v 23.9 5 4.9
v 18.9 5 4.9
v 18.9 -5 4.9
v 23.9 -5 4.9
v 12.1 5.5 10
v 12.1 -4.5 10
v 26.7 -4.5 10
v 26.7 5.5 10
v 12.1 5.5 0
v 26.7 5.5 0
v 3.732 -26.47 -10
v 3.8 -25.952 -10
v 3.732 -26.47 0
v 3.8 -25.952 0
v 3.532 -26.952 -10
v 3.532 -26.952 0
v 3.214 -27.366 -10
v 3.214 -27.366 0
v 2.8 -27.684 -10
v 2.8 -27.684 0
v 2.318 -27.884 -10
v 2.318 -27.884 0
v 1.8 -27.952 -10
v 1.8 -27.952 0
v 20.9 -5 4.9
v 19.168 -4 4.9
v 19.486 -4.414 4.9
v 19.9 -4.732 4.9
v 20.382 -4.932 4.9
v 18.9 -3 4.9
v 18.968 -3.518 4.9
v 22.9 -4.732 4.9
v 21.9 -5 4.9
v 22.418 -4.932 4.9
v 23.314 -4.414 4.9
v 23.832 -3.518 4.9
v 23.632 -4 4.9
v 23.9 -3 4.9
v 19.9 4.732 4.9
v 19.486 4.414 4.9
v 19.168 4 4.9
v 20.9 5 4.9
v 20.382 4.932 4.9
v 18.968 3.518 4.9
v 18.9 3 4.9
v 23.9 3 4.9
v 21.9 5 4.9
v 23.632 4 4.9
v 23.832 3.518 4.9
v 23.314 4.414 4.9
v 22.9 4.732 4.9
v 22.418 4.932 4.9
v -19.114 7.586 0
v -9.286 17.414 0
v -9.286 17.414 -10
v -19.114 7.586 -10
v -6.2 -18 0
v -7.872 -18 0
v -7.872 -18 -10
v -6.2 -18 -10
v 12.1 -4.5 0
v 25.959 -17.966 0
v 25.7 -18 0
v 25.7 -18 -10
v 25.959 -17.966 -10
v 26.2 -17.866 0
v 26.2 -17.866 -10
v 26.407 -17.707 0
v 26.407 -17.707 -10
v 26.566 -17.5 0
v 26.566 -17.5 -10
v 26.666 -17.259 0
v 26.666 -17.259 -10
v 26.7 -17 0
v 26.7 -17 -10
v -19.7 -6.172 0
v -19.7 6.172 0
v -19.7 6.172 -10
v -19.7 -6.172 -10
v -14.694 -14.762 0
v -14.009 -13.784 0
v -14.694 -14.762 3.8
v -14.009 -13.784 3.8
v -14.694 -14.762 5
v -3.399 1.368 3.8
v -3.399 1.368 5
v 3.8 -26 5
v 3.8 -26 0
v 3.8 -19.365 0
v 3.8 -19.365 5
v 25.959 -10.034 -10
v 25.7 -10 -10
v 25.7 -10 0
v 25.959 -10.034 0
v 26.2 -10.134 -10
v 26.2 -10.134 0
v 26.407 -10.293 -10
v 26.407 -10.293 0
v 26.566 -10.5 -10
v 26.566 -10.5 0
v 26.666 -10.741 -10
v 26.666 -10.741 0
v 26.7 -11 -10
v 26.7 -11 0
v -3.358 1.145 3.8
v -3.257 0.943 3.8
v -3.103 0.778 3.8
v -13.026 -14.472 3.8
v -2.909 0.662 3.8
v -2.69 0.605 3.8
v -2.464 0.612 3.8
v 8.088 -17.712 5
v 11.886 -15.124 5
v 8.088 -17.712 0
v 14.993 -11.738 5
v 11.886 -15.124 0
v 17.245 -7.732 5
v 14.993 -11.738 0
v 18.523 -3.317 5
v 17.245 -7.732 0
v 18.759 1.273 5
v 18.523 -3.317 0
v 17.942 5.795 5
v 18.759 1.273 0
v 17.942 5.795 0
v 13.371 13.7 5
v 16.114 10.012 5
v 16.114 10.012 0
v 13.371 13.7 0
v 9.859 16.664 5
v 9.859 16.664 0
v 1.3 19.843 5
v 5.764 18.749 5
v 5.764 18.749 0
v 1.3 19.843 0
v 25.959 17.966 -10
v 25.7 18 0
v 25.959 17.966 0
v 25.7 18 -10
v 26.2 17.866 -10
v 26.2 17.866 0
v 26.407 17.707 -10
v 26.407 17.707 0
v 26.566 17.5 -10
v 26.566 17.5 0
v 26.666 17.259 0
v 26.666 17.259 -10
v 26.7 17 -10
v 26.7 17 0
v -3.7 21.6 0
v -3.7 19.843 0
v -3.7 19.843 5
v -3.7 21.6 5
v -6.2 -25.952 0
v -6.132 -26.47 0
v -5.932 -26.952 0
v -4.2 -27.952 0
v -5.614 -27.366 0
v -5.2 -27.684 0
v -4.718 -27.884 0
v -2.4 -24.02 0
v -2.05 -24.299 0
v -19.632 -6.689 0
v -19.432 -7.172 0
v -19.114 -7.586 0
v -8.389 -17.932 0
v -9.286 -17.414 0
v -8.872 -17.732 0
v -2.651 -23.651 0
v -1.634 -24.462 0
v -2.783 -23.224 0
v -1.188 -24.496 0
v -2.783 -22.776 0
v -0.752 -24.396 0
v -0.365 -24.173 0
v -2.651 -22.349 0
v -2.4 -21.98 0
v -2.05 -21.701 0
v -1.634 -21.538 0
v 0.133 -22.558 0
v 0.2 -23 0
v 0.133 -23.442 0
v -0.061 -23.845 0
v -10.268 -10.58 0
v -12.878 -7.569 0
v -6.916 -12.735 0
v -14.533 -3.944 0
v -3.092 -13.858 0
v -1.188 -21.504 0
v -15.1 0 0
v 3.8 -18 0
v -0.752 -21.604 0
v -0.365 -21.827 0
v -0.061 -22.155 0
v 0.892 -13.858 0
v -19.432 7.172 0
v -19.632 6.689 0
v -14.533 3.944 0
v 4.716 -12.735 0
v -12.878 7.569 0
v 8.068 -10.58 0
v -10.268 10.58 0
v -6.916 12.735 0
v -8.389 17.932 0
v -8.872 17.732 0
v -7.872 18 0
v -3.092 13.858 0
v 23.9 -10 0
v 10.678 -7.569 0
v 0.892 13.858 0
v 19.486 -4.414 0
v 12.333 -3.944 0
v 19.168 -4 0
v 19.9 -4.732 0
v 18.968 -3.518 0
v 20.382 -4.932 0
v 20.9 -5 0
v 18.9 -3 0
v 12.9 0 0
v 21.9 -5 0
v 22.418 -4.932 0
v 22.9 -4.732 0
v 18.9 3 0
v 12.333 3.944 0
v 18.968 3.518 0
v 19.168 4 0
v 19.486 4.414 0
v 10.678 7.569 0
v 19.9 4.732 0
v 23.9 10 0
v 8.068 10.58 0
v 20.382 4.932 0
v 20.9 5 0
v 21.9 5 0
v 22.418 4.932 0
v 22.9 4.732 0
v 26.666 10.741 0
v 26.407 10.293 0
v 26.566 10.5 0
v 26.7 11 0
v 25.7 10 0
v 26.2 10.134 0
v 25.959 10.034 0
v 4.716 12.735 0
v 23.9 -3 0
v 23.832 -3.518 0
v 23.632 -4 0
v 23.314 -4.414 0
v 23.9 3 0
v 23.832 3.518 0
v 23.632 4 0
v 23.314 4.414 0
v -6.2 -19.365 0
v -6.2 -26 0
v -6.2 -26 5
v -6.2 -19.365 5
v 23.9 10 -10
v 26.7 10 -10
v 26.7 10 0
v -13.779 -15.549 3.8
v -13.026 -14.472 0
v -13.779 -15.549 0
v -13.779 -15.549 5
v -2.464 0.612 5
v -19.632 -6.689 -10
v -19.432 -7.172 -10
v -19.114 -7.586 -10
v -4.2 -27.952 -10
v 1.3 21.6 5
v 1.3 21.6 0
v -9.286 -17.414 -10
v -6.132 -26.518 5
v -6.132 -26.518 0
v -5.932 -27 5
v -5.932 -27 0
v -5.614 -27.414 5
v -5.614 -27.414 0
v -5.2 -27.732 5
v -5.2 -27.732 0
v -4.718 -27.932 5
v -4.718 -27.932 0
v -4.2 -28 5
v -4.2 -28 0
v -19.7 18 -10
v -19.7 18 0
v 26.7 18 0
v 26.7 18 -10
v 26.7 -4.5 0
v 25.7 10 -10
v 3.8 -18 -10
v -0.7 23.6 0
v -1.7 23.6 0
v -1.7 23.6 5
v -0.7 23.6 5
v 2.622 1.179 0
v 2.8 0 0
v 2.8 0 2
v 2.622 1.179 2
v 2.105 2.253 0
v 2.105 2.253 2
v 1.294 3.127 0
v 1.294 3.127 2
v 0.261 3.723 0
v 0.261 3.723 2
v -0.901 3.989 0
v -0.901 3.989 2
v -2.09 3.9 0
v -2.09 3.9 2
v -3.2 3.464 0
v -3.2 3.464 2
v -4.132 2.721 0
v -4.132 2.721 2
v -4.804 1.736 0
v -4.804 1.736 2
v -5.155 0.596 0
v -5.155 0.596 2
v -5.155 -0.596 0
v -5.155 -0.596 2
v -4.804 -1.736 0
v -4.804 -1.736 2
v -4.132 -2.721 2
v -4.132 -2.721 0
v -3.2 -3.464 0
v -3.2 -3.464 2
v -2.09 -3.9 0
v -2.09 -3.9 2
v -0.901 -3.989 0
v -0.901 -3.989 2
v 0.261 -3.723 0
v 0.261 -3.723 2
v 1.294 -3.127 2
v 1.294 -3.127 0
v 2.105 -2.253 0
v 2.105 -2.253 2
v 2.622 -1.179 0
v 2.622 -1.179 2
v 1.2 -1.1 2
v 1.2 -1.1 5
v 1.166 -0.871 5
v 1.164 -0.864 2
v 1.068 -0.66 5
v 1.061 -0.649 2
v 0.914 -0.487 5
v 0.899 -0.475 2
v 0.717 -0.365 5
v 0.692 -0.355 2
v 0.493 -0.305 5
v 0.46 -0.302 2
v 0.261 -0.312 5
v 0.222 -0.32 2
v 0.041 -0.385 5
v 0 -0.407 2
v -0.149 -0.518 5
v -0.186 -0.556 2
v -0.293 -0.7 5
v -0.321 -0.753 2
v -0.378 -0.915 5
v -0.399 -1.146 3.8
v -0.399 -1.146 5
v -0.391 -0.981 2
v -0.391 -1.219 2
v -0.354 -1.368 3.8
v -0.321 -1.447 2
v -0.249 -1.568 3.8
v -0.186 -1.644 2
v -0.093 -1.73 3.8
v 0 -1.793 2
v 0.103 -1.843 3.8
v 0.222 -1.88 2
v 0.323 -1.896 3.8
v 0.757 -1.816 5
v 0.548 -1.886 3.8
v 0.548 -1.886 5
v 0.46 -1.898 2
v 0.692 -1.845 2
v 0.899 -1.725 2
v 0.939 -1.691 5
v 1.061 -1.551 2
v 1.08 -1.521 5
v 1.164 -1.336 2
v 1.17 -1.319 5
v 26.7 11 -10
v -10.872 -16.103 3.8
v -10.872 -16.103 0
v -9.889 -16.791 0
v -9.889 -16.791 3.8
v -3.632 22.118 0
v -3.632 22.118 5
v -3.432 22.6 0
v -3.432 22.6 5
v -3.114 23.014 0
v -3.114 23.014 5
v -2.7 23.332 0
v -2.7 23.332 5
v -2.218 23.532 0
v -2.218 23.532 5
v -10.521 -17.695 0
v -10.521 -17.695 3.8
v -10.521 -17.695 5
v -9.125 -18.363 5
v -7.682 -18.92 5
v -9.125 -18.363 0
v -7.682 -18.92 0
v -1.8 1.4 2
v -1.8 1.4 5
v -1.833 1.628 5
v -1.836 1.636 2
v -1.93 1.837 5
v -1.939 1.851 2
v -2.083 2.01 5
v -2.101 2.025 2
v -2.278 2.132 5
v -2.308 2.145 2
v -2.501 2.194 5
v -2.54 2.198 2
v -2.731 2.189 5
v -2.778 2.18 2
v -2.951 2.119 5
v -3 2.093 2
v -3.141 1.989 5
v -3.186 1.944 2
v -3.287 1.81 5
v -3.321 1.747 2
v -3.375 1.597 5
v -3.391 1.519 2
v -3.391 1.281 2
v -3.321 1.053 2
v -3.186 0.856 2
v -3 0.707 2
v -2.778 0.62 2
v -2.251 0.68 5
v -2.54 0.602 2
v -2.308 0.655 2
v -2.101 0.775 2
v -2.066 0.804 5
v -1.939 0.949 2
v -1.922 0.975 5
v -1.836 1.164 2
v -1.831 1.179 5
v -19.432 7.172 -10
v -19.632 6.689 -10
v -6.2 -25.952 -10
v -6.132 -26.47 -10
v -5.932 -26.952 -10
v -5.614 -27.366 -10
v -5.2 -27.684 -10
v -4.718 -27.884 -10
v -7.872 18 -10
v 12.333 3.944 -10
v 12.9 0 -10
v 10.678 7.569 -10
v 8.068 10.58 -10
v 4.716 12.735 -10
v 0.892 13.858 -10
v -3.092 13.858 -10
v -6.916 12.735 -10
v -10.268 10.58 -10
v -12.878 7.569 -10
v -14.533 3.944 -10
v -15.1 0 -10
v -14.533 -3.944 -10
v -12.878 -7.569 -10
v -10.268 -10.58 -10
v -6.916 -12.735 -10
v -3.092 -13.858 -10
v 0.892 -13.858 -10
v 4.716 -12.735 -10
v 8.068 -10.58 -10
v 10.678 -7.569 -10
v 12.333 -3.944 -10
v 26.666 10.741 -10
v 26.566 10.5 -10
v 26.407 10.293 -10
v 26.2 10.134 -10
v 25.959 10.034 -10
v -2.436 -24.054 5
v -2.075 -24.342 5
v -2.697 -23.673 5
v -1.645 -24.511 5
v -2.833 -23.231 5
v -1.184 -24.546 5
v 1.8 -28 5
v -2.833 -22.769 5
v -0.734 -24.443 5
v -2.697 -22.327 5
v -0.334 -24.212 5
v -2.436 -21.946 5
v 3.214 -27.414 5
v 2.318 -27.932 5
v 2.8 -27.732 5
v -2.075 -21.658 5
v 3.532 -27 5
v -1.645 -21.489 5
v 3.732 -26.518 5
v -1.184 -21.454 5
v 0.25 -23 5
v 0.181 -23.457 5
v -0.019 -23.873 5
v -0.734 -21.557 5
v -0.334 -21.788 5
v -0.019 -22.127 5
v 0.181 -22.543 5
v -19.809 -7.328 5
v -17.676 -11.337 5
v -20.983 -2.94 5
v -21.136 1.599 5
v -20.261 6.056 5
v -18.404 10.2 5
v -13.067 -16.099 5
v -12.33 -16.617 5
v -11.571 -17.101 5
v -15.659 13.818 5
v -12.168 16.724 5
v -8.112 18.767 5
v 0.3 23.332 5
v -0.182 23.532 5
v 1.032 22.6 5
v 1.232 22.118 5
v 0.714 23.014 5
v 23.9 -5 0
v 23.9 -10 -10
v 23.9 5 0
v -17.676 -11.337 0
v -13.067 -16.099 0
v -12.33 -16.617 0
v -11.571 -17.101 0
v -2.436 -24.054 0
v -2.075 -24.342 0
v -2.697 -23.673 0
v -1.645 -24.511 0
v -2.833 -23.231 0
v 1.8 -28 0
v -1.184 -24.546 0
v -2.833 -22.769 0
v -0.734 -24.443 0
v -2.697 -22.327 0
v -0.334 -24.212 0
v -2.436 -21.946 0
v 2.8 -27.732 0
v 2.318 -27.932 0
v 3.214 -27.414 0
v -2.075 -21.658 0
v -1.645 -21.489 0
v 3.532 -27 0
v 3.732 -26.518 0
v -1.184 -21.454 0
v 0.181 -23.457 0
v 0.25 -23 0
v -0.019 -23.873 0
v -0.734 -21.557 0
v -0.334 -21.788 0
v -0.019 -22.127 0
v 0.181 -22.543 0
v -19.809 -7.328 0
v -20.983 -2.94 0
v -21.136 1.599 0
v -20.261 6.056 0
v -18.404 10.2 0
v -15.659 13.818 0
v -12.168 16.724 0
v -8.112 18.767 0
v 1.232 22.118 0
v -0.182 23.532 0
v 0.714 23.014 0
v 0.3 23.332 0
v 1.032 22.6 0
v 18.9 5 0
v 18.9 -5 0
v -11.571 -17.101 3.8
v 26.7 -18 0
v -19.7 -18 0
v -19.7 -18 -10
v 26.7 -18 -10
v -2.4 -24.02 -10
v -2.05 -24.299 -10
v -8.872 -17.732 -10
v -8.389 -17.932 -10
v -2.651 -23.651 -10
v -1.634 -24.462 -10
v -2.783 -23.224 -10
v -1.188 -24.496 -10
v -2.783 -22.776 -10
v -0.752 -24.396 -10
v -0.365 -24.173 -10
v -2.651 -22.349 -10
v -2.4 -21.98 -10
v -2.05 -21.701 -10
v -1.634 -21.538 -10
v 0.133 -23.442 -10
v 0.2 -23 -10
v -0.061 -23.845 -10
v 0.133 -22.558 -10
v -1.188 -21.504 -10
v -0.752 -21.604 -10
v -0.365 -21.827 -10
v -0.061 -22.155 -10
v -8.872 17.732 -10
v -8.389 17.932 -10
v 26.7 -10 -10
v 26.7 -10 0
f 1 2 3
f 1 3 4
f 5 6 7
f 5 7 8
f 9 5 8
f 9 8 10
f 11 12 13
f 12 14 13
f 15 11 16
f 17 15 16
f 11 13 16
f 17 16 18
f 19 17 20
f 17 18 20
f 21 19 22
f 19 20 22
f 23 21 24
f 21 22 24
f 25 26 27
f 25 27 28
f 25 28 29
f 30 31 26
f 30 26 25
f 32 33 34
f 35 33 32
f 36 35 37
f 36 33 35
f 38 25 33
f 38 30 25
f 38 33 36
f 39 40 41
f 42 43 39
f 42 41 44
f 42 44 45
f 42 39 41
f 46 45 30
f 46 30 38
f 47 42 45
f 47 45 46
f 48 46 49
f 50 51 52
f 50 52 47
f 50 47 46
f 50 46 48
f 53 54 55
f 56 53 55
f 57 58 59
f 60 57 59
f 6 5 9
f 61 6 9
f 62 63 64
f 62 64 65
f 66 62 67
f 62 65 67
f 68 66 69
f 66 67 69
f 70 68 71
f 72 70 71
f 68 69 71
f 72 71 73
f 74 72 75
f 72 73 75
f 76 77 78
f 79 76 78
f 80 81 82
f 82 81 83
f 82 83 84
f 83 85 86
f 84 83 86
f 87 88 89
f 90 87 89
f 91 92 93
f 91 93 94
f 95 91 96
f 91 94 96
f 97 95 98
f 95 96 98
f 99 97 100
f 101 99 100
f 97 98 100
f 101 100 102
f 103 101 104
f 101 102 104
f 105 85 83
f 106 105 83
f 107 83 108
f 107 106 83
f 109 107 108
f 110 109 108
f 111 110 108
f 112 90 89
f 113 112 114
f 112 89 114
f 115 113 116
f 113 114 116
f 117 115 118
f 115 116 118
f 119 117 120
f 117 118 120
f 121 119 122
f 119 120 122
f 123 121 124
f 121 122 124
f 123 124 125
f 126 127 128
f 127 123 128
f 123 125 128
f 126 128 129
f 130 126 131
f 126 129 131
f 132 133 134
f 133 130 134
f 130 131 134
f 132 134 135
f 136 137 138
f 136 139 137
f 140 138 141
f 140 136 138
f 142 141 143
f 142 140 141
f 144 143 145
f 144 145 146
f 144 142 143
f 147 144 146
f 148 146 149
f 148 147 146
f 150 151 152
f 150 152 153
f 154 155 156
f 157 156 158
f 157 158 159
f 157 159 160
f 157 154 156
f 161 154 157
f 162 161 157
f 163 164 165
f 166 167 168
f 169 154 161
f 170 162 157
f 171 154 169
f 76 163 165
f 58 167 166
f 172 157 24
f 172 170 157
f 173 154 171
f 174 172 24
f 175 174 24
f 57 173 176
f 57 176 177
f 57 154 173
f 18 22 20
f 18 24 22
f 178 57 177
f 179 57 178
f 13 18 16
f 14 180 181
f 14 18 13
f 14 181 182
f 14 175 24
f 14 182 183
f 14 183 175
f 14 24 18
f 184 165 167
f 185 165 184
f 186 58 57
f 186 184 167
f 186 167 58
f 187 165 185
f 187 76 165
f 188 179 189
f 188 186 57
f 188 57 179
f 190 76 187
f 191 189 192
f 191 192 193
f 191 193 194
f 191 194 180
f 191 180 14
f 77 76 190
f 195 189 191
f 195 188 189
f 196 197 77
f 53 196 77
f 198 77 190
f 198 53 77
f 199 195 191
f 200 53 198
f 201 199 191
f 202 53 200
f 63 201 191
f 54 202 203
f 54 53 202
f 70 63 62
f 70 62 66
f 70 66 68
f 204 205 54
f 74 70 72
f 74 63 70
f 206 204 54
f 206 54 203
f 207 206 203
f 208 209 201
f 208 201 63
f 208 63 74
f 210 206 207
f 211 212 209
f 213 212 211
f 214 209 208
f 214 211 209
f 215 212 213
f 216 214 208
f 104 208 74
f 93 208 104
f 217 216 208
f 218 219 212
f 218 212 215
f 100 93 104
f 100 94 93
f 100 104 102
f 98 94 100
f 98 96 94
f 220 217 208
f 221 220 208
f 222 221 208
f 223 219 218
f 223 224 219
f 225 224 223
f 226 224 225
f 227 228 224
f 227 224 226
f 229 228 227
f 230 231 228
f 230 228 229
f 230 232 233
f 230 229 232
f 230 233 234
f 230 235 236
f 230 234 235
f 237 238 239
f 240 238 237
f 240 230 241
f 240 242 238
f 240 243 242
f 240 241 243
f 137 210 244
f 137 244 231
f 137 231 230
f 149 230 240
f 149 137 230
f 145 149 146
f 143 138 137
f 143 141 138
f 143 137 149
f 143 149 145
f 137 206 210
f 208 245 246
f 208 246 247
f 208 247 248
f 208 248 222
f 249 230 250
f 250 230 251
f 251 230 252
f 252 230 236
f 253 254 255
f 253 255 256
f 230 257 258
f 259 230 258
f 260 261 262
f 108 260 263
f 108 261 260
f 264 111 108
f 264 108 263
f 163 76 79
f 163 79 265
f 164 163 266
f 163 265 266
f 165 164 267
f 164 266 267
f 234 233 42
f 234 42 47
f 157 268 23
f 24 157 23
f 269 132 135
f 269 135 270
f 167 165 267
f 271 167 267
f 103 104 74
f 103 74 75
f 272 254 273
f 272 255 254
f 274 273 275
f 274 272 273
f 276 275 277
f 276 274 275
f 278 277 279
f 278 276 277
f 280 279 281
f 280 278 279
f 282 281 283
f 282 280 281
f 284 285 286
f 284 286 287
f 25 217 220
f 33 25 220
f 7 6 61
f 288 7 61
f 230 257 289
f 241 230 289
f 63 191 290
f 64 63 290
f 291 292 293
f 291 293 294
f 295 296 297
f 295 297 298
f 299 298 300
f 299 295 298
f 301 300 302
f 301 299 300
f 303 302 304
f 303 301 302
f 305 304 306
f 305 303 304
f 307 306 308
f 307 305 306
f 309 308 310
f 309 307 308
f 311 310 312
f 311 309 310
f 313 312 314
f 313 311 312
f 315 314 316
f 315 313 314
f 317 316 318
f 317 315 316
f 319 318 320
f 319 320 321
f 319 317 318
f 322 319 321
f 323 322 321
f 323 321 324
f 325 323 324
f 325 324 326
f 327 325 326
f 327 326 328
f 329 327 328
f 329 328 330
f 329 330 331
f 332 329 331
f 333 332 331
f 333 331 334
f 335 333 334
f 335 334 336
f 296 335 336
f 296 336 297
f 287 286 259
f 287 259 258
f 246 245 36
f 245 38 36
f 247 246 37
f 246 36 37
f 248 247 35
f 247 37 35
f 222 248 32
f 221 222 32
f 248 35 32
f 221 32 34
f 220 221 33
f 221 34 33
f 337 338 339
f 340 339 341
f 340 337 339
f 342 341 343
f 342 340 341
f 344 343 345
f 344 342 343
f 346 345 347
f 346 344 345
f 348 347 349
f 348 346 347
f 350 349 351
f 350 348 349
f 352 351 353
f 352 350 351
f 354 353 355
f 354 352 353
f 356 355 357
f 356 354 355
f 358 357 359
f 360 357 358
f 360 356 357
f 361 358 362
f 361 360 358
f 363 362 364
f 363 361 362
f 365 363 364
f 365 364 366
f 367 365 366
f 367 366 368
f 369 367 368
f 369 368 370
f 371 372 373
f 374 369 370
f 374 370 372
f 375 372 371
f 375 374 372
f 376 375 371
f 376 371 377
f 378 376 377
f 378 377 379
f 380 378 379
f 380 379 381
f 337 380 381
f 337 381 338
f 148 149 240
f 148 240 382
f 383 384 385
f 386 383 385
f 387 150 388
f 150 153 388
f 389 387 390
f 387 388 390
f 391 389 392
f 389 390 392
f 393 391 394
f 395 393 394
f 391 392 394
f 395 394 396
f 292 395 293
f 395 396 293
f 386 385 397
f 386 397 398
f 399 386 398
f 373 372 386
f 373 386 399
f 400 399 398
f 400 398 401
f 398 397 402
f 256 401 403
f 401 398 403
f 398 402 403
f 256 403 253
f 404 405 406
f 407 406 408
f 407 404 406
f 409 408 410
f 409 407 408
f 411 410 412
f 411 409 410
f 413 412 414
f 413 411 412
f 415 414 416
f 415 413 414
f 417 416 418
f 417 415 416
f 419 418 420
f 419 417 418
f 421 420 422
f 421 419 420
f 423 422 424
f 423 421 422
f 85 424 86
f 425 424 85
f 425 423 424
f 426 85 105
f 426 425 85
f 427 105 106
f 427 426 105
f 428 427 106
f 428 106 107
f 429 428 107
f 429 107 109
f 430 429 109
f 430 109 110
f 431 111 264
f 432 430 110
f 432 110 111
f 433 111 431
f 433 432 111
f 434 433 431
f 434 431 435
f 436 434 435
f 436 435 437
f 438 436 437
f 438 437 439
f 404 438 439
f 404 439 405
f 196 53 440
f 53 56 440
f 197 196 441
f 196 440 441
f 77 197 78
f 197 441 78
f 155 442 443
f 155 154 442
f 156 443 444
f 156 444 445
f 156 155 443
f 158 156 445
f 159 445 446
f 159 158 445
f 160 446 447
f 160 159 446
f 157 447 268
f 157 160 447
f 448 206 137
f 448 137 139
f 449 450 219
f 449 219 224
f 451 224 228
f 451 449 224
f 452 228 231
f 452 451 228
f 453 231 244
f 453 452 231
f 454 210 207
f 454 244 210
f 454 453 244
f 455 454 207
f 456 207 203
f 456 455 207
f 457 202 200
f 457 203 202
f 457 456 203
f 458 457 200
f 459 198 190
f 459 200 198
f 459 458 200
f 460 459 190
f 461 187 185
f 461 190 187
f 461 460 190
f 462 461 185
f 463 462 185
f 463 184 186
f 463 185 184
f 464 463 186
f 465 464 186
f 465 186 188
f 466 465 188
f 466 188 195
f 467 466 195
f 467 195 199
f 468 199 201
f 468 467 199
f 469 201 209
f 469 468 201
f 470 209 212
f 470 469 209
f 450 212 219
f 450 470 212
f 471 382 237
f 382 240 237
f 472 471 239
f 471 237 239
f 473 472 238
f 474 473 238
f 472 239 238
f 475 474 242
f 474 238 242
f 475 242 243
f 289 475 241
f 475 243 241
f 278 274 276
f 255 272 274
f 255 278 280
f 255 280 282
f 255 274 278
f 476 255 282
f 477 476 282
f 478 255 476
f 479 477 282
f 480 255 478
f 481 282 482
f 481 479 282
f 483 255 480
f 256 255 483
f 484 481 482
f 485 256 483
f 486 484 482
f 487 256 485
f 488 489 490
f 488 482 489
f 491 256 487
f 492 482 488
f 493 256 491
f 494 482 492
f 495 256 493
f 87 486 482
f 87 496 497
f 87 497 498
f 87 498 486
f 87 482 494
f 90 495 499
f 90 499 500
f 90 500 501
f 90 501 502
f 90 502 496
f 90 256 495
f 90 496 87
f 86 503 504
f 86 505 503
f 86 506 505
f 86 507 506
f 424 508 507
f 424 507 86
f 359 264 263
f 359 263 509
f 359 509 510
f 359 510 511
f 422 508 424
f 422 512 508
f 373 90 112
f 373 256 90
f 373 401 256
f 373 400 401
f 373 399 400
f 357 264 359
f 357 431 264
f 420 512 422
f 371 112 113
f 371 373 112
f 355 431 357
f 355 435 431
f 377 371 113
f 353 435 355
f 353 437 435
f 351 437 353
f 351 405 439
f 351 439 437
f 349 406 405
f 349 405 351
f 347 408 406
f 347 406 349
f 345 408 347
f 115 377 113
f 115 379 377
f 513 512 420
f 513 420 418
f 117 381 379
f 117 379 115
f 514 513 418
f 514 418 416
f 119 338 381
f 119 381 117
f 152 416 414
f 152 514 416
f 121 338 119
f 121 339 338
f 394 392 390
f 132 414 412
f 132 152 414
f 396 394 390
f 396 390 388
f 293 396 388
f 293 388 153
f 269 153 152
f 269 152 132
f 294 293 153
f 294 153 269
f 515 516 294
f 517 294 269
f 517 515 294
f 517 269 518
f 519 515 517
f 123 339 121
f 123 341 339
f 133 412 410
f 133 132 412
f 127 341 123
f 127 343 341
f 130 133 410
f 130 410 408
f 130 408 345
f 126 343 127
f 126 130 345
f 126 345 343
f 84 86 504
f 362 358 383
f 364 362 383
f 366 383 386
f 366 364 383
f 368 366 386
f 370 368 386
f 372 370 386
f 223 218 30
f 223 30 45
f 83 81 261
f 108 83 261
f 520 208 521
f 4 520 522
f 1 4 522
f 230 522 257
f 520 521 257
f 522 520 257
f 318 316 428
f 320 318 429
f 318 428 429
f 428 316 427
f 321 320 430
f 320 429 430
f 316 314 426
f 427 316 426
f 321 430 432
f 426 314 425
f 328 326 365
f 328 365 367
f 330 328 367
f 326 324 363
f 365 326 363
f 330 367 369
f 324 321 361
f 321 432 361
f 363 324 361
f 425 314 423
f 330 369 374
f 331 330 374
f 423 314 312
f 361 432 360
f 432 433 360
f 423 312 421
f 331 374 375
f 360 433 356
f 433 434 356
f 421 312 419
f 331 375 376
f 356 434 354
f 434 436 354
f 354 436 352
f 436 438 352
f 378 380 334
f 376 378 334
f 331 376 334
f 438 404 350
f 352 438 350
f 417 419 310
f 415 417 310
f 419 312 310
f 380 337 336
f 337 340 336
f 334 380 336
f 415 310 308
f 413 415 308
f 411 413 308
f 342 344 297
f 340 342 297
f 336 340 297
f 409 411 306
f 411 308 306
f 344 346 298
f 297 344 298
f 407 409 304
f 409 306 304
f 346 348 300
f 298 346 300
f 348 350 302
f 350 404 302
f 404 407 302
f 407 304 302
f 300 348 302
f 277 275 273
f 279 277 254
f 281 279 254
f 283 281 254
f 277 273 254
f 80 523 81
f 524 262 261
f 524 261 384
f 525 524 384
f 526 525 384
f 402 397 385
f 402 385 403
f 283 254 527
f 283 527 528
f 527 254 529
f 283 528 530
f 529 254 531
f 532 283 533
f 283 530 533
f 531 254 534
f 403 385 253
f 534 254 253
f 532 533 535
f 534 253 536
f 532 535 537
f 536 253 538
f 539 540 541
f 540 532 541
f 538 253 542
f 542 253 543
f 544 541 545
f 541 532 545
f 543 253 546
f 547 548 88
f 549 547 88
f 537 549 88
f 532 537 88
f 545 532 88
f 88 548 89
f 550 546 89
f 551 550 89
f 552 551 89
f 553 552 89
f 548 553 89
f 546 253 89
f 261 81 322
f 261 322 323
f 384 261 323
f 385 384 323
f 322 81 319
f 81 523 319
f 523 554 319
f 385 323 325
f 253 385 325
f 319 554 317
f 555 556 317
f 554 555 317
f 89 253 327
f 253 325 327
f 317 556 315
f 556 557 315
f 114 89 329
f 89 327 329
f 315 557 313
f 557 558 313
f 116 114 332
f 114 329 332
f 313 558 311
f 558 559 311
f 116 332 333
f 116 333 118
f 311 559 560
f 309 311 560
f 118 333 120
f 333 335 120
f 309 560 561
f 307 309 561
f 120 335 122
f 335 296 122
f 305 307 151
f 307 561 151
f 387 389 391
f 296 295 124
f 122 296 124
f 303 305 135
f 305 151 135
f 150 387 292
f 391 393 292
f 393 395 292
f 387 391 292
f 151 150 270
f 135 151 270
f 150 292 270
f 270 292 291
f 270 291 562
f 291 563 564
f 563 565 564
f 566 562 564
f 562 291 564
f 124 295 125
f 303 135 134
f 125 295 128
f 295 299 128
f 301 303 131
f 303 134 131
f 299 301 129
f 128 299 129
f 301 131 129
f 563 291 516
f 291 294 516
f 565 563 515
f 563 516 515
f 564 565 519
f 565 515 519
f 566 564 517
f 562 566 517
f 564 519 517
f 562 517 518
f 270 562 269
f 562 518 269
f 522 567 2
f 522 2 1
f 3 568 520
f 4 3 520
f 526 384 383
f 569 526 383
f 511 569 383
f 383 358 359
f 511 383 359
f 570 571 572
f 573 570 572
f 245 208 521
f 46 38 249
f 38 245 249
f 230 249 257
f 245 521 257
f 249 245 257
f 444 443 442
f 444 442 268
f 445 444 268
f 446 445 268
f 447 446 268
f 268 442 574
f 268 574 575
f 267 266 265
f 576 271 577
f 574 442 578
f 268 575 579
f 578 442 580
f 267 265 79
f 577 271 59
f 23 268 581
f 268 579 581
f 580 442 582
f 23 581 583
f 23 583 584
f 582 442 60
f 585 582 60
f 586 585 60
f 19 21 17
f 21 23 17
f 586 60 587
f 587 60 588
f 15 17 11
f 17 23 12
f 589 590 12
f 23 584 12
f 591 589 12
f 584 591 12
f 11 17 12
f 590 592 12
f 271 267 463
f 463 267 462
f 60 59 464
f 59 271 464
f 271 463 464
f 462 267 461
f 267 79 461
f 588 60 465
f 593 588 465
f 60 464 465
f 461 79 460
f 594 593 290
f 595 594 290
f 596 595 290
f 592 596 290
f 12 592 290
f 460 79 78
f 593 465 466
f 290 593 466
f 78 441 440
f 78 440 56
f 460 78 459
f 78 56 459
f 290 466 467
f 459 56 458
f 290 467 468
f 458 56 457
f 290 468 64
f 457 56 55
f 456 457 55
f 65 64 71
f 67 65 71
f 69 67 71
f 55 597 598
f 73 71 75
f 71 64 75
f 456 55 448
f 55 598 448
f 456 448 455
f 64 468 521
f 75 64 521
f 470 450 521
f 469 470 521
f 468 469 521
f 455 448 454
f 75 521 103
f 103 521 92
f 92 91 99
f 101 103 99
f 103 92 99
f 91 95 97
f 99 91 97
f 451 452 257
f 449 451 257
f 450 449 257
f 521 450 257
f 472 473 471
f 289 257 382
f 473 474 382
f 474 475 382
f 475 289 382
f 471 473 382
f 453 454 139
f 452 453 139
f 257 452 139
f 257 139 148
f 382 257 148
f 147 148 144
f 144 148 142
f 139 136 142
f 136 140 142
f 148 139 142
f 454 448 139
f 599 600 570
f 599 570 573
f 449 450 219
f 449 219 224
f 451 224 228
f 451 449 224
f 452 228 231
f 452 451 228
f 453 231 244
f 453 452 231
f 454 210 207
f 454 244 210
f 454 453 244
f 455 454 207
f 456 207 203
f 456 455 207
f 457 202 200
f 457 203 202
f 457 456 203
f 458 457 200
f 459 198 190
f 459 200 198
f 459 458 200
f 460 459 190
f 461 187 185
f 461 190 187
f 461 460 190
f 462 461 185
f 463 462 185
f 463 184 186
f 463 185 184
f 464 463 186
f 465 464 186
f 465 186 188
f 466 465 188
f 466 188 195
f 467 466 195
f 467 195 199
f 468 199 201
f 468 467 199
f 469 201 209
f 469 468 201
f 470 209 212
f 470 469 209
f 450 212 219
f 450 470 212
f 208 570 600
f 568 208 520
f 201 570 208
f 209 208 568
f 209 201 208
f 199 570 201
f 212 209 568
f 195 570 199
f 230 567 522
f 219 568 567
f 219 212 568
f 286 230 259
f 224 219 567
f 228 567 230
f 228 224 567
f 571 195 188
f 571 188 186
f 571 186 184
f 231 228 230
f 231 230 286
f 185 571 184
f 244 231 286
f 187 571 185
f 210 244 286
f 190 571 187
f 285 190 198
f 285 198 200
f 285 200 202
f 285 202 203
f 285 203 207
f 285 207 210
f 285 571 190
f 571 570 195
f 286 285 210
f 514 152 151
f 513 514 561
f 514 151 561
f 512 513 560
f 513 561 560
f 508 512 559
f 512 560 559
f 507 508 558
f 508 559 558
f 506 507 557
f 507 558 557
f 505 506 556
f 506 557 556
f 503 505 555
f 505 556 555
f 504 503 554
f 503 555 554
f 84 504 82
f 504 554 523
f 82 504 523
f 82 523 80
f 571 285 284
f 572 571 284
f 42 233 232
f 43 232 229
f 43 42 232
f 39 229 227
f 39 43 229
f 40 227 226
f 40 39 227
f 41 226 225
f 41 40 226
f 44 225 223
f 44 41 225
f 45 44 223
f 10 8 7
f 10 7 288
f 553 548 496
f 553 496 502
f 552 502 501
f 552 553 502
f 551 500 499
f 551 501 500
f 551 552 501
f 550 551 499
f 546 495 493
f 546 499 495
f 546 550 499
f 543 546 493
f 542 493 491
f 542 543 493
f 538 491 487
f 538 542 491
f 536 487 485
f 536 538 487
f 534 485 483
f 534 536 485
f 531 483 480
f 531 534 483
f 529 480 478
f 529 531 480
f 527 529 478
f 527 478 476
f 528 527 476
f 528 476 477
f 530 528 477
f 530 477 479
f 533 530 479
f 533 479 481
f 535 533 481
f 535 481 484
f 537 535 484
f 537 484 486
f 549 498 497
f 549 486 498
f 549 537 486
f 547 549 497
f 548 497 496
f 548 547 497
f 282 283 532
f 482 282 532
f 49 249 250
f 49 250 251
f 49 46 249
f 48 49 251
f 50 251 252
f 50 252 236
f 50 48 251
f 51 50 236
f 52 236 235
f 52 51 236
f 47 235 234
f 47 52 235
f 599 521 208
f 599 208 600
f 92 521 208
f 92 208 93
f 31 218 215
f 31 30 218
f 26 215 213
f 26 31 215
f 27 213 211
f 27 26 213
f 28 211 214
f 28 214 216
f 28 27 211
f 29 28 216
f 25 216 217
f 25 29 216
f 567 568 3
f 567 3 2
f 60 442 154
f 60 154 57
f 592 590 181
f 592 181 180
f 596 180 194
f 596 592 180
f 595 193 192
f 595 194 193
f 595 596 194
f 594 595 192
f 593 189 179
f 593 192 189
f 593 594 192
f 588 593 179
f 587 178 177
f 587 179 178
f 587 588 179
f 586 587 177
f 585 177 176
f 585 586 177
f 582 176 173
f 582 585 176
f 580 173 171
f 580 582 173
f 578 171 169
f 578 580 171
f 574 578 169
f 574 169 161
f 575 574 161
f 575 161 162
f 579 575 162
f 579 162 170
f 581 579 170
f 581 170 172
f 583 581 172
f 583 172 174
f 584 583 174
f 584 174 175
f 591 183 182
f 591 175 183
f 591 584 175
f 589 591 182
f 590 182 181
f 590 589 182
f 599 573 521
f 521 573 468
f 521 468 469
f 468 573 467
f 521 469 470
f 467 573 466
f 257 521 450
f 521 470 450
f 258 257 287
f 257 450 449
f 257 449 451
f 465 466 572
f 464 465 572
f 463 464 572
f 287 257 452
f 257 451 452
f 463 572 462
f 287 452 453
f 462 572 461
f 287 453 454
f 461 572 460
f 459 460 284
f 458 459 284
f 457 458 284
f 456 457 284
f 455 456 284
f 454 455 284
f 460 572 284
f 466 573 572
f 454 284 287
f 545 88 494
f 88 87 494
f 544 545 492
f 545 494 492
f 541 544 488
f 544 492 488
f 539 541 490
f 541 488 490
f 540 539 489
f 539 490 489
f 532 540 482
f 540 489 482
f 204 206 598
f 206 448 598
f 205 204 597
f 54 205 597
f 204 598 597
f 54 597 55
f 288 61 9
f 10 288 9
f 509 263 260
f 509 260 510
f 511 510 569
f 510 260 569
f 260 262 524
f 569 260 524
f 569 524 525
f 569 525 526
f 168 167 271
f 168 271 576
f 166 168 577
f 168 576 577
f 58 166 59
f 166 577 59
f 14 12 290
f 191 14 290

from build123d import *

# Parameters (mm, degrees)
BOX001_W               = 10
BOX001_H               = 10
BOX001_DEPTH           = 14.6
BOX004_W               = 5
BOX004_H               = 10
BOX004_DEPTH           = 5
BOX005_W               = 10
BOX005_H               = 20
BOX005_DEPTH           = 20
CYLINDER_R             = 14
CYLINDER_DEPTH         = 40
BOX_W                  = 10
BOX_H                  = 36
BOX_DEPTH              = 46.4
BOX006_W               = 5
BOX006_H               = 5
BOX006_DEPTH           = 5
CYLINDER003_R          = 1.55
CYLINDER003_DEPTH      = 50
BOX003_W               = 10
BOX003_H               = 14
BOX003_DEPTH           = 5
BOX010_W               = 1.2
BOX010_H               = 30
BOX010_DEPTH           = 10
BOX010_ROLL_ANGLE      = 90
BOX010_PLACEMENT_ANGLE = -35
BOX009_W               = 1.2
BOX009_H               = 30
BOX009_DEPTH           = 10
BOX009_ROLL_ANGLE      = 90
BOX009_PLACEMENT_ANGLE = -35
BOX008_W               = 1.2
BOX008_H               = 30
BOX008_DEPTH           = 10
BOX008_PLACEMENT_ANGLE = 325
BOX007_W               = 1.2
BOX007_H               = 30
BOX007_DEPTH           = 10
BOX007_PLACEMENT_ANGLE = 325
CYLINDER006_R          = 0.8
CYLINDER006_DEPTH      = 30
CYLINDER005_R          = 0.8
CYLINDER005_DEPTH      = 30
CYLINDER004_R          = 4
CYLINDER004_DEPTH      = 10
CYLINDER002_R          = 20
CYLINDER002_DEPTH      = 5
FILLET_R               = 2
CYLINDER001_R          = 1.5
CYLINDER001_DEPTH      = 30
BOX002_W               = 10
BOX002_H               = 10
BOX002_DEPTH           = 10
FILLET001_R            = 2
FILLET002_R            = 1
FILLET003_R            = 1
FILLET004_R            = 2
CHAMFER_SIZE           = 11
FILLET005_R            = 2


with BuildPart() as cube001:
    # Box001 → Box001 (new body)
    with BuildSketch(Plane(origin=(12.1, -4.5, 10), x_dir=(0, 0, -1), z_dir=(1, 0, 0))):
        with Locations((5, 5)):
            Rectangle(BOX001_W, BOX001_H)
    extrude(amount=BOX001_DEPTH)


with BuildPart() as swivelstop:
    # Box004 → Box004 (new body)
    with BuildSketch(Plane(origin=(18.9, -5, -0.1), x_dir=(1, 0, 0), z_dir=(0, 0, 1))):
        with Locations((2.5, 5)):
            Rectangle(BOX004_W, BOX004_H)
    extrude(amount=BOX004_DEPTH)


with BuildPart() as footcutout:
    # Box005 → Box005 (new body)
    with BuildSketch(Plane(origin=(23.9, -10, -18), x_dir=(1, 0, 0), z_dir=(0, 0, 1))):
        with Locations((5, 10)):
            Rectangle(BOX005_W, BOX005_H)
    extrude(amount=BOX005_DEPTH)


with BuildPart() as cardboardbarrelholder:
    # Cylinder → Cylinder (new body)
    with BuildSketch(Plane(origin=(-1.1, 0, -20), x_dir=(1, 0, 0), z_dir=(0, 0, 1))):
        Circle(CYLINDER_R)
    extrude(amount=CYLINDER_DEPTH)


with BuildPart() as mainpiece1:
    # Box → Box (new body)
    with BuildSketch(Plane(origin=(-19.7, -18, 0), x_dir=(0, 0, -1), z_dir=(1, 0, 0))):
        with Locations((5, 18)):
            Rectangle(BOX_W, BOX_H)
    extrude(amount=BOX_DEPTH)

    # Cut: cut cardboardBarrelHolder
    add(cardboardbarrelholder.part, mode=Mode.SUBTRACT)

    # Cut001: cut footCutout
    add(footcutout.part, mode=Mode.SUBTRACT)


with BuildPart() as don_tusemainpiece3:
    # Fusion002 base: copy of mainPiece1
    add(mainpiece1.part)

    # Fusion002: union swivelStop
    add(swivelstop.part)


with BuildPart() as shuttermovetab:
    # Box006 → Box006 (new body)
    with BuildSketch(Plane(origin=(-3.7, 18.6, 0), x_dir=(1, 0, 0), z_dir=(0, 0, 1))):
        with Locations((2.5, 2.5)):
            Rectangle(BOX006_W, BOX006_H)
    extrude(amount=BOX006_DEPTH)


with BuildPart() as shuttertabhole:
    # Cylinder003 → Cylinder003 (new body)
    with BuildSketch(Plane(origin=(-1.3, -23, -12), x_dir=(1, 0, 0), z_dir=(0, 0, 1))):
        Circle(CYLINDER003_R)
    extrude(amount=CYLINDER003_DEPTH)


with BuildPart() as shutterhingetab001:
    # Box003 → Box003 (new body)
    with BuildSketch(Plane(origin=(-6.2, -28, 0), x_dir=(1, 0, 0), z_dir=(0, 0, 1))):
        with Locations((5, 7)):
            Rectangle(BOX003_W, BOX003_H)
    extrude(amount=BOX003_DEPTH)

    # Cut009: cut shutterTabHole
    add(shuttertabhole.part, mode=Mode.SUBTRACT)


with BuildPart() as radialtransit4:
    # Box010 → Box010 (new body)
    with BuildSketch(Plane.XY):
        with Locations((0.6, 15)):
            Rectangle(BOX010_W, BOX010_H)
    extrude(amount=BOX010_DEPTH)


with BuildPart() as radialtransit4_1:
    # Box010 roll: moved
    add(radialtransit4.part.rotate(Axis((0, 0, 0), (1, 0, 0)), BOX010_ROLL_ANGLE))


with BuildPart() as radialtransit4_2:
    # Box010 placement: moved
    add(radialtransit4_1.part.moved(Location((-14.008889, -13.784169, -4.1))).rotate(Axis((-14.008889, -13.784169, -4.1), (0, 0, 1)), BOX010_PLACEMENT_ANGLE))


with BuildPart() as radialtransit3:
    # Box009 → Box009 (new body)
    with BuildSketch(Plane.XY):
        with Locations((0.6, 15)):
            Rectangle(BOX009_W, BOX009_H)
    extrude(amount=BOX009_DEPTH)


with BuildPart() as radialtransit3_1:
    # Box009 roll: moved
    add(radialtransit3.part.rotate(Axis((0, 0, 0), (1, 0, 0)), BOX009_ROLL_ANGLE))


with BuildPart() as radialtransit3_2:
    # Box009 placement: moved
    add(radialtransit3_1.part.moved(Location((-10.871554, -16.103032, -4.1))).rotate(Axis((-10.871554, -16.103032, -4.1), (0, 0, 1)), BOX009_PLACEMENT_ANGLE))


with BuildPart() as radialtransit2:
    # Box008 → Box008 (new body)
    with BuildSketch(Plane.XY):
        with Locations((0.6, 15)):
            Rectangle(BOX008_W, BOX008_H)
    extrude(amount=BOX008_DEPTH)


with BuildPart() as radialtransit2_1:
    # Box008 placement: moved
    add(radialtransit2.part.moved(Location((-20.375588, -22.876757, 3.8))).rotate(Axis((-20.375588, -22.876757, 3.8), (0, 0, 1)), BOX008_PLACEMENT_ANGLE))


with BuildPart() as radialtransit1:
    # Box007 → Box007 (new body)
    with BuildSketch(Plane.XY):
        with Locations((0.6, 15)):
            Rectangle(BOX007_W, BOX007_H)
    extrude(amount=BOX007_DEPTH)


with BuildPart() as radialtransit1_1:
    # Box007 placement: moved
    add(radialtransit1.part.moved(Location((-17.352968, -25.35945, 3.8))).rotate(Axis((-17.352968, -25.35945, 3.8), (0, 0, 1)), BOX007_PLACEMENT_ANGLE))


with BuildPart() as cdswire2:
    # Cylinder006 → Cylinder006 (new body)
    with BuildSketch(Plane(origin=(-2.6, 1.4, -18), x_dir=(1, 0, 0), z_dir=(0, 0, 1))):
        Circle(CYLINDER006_R)
    extrude(amount=CYLINDER006_DEPTH)


with BuildPart() as cdswire1:
    # Cylinder005 → Cylinder005 (new body)
    with BuildSketch(Plane(origin=(0.4, -1.1, -18), x_dir=(1, 0, 0), z_dir=(0, 0, 1))):
        Circle(CYLINDER005_R)
    extrude(amount=CYLINDER005_DEPTH)


with BuildPart() as cdsdivot:
    # Cylinder004 → Cylinder004 (new body)
    with BuildSketch(Plane(origin=(-1.2, 0, -8), x_dir=(1, 0, 0), z_dir=(0, 0, 1))):
        Circle(CYLINDER004_R)
    extrude(amount=CYLINDER004_DEPTH)


with BuildPart() as shutter11:
    # Cylinder002 → Cylinder002 (new body)
    with BuildSketch(Plane(origin=(-1.2, 0, 0), x_dir=(1, 0, 0), z_dir=(0, 0, 1))):
        Circle(CYLINDER002_R)
    extrude(amount=CYLINDER002_DEPTH)

    # Cut002: cut CdSDivot
    add(cdsdivot.part, mode=Mode.SUBTRACT)

    # Cut003: cut CdSWire1
    add(cdswire1.part, mode=Mode.SUBTRACT)

    # Cut004: cut CdsWire2
    add(cdswire2.part, mode=Mode.SUBTRACT)

    # Cut005: cut radialTransit1
    add(radialtransit1_1.part, mode=Mode.SUBTRACT)

    # Cut006: cut radialTransit2
    add(radialtransit2_1.part, mode=Mode.SUBTRACT)

    # Cut007: cut radialTransit3
    add(radialtransit3_2.part, mode=Mode.SUBTRACT)

    # Cut008: cut radialTransit4
    add(radialtransit4_2.part, mode=Mode.SUBTRACT)

    # Fusion001: union shutterHingeTab001
    add(shutterhingetab001.part)

    # Fusion003: union shutterMoveTab
    add(shuttermovetab.part)

    # Fillet
    fillet_edges = [shutter11.edges().sort_by_distance(p)[0] for p in [
        (-3.7, 23.6, 2.5),
        (1.3, 23.6, 2.5),
        (3.8, -28, 2.5),
        (-6.2, -28, 2.5),
    ]]
    fillet(fillet_edges, radius=FILLET_R)


with BuildPart() as hingetabhole:
    # Cylinder001 → Cylinder001 (new body)
    with BuildSketch(Plane(origin=(-1.3, -23, -12), x_dir=(1, 0, 0), z_dir=(0, 0, 1))):
        Circle(CYLINDER001_R)
    extrude(amount=CYLINDER001_DEPTH)


with BuildPart() as mainpiecehingetab:
    # Box002 → Box002 (new body)
    with BuildSketch(Plane(origin=(-6.2, -27.952, -10), x_dir=(1, 0, 0), z_dir=(0, 0, 1))):
        with Locations((5, 5)):
            Rectangle(BOX002_W, BOX002_H)
    extrude(amount=BOX002_DEPTH)

    # Cut010: cut hingeTabHole
    add(hingetabhole.part, mode=Mode.SUBTRACT)


with BuildPart() as mainpiecebooleaned10:
    # Fusion base: copy of mainPiece1
    add(mainpiece1.part)

    # Fusion: union mainPieceHingeTab
    add(mainpiecehingetab.part)

    # Fusion004: union swivelStop
    add(swivelstop.part)

    # Fillet001
    fillet001_edges = [mainpiecebooleaned10.edges().sort_by_distance(p)[0] for p in [
        (-6.2, -27.952, -5),
        (3.8, -27.952, -5),
    ]]
    fillet(fillet001_edges, radius=FILLET001_R)

    # Fillet002
    fillet002_edges = [mainpiecebooleaned10.edges().sort_by_distance(p)[0] for p in [
        (26.7, -18, -5),
        (26.7, 18, -5),
    ]]
    fillet(fillet002_edges, radius=FILLET002_R)

    # Fillet003
    fillet003_edges = [mainpiecebooleaned10.edges().sort_by_distance(p)[0] for p in [
        (26.7, -10, -5),
        (26.7, 10, -5),
    ]]
    fillet(fillet003_edges, radius=FILLET003_R)

    # Fillet004
    fillet004_edges = [mainpiecebooleaned10.edges().sort_by_distance(p)[0] for p in [
        (23.9, -5, 2.45),
        (18.9, -5, 2.45),
        (18.9, 5, 2.45),
        (23.9, 5, 2.45),
    ]]
    fillet(fillet004_edges, radius=FILLET004_R)

    # Chamfer
    chamfer_edges = [mainpiecebooleaned10.edges().sort_by_distance(p)[0] for p in [
        (-19.7, -18, -5),
        (-19.7, 18, -5),
    ]]
    chamfer(chamfer_edges, length=CHAMFER_SIZE)

    # Fillet005
    fillet005_edges = [mainpiecebooleaned10.edges().sort_by_distance(p)[0] for p in [
        (-8.7, -18, -5),
        (-19.7, -7, -5),
        (-19.7, 7, -5),
        (-8.7, 18, -5),
    ]]
    fillet(fillet005_edges, radius=FILLET005_R)


solid = Compound([cube001.part, don_tusemainpiece3.part, shutter11.part, mainpiecebooleaned10.part])
